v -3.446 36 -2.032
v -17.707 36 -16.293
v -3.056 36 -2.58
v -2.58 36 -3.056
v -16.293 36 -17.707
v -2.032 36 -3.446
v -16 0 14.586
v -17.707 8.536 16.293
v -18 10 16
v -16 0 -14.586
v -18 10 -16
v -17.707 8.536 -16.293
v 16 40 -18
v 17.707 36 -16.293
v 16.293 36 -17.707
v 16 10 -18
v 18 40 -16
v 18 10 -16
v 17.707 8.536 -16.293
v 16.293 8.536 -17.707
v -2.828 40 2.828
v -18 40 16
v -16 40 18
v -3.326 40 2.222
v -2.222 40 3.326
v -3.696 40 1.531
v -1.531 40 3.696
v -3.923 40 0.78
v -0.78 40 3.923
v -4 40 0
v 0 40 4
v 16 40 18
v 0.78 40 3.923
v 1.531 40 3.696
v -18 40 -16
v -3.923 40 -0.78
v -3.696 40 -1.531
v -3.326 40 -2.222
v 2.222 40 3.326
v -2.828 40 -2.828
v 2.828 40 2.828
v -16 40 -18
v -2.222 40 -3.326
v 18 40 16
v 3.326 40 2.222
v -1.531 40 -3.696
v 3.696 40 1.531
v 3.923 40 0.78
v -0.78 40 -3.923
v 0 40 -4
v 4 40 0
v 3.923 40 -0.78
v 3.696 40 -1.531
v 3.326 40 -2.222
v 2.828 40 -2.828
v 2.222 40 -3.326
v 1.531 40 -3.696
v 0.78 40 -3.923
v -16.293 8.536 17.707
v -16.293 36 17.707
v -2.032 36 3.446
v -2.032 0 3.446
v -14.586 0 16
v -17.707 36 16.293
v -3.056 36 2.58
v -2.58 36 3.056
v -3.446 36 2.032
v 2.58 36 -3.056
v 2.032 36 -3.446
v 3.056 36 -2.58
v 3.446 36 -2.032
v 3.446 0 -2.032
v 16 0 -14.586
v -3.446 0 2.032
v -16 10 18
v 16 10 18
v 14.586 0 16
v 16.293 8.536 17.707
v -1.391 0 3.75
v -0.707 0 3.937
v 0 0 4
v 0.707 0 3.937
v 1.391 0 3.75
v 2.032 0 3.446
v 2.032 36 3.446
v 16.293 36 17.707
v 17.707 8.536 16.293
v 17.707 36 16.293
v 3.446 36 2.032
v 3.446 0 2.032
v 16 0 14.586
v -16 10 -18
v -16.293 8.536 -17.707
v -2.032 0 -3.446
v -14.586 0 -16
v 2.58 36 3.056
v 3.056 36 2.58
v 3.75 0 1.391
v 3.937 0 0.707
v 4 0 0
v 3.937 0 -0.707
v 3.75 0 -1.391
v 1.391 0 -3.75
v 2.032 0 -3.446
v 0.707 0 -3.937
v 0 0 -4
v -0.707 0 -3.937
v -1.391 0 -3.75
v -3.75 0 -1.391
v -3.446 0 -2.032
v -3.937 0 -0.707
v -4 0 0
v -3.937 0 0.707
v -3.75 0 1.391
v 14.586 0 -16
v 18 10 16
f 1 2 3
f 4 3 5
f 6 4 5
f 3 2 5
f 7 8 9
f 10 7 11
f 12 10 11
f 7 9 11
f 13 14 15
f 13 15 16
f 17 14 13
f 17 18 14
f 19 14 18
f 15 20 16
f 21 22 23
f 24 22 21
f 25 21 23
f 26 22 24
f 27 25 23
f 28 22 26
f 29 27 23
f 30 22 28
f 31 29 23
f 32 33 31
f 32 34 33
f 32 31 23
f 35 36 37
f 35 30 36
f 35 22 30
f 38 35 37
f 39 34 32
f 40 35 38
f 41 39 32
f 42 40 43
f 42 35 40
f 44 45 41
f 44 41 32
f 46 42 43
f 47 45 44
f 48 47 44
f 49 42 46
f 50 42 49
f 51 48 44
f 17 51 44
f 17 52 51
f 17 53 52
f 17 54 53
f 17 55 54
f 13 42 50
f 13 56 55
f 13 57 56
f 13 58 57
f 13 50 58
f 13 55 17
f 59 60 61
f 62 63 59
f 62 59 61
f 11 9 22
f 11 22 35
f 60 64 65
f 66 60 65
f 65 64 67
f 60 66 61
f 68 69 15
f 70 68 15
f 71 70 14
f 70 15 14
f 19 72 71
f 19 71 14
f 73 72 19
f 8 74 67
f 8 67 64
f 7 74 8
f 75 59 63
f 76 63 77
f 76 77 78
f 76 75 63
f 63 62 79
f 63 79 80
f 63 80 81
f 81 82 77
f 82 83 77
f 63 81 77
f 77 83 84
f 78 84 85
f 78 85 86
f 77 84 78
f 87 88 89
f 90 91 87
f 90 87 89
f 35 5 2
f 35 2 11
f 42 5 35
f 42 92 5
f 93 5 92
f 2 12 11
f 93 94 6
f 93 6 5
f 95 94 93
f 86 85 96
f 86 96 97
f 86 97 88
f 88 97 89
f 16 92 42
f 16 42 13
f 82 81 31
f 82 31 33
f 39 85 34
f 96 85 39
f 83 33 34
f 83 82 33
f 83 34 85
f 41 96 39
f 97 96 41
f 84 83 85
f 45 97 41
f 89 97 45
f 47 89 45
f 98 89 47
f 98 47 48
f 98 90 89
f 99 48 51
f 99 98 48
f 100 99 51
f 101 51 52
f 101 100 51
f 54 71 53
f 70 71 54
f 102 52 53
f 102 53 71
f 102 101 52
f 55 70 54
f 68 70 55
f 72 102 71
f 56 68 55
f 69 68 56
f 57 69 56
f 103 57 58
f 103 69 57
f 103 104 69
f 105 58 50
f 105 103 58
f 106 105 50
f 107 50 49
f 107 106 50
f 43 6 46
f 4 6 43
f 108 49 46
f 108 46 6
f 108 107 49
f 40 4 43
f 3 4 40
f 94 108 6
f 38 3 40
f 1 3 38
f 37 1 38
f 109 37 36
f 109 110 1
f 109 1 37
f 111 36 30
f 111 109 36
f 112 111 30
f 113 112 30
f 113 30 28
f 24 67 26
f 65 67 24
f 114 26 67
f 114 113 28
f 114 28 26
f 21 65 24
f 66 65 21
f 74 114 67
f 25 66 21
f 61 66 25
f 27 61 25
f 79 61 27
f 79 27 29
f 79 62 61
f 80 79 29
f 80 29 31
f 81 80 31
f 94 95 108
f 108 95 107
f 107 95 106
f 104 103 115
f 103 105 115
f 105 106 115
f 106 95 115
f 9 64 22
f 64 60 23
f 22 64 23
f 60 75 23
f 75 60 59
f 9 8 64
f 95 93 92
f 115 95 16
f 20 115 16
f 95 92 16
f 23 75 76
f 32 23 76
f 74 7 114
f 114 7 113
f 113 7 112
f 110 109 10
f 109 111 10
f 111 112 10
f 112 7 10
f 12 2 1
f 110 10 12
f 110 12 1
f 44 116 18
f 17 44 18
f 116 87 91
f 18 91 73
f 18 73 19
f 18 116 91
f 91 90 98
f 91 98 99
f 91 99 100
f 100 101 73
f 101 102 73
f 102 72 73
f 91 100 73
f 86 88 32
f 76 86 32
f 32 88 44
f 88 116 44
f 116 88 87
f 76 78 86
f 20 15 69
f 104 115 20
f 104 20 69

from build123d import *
from OCP.BRepFilletAPI import BRepFilletAPI_MakeChamfer

# Parameters (mm, degrees)
SKETCH1_W           = 36
SKETCH1_H           = 36
SKETCH1_R           = 4
BOSS_EXTRUDE1_DEPTH = 40
CUT_EXTRUDE1_DEPTH  = 36
CHAMFER1_SIZE       = 2
CHAMFER2_SIZE       = 2
CHAMFER2_SIZE2      = 10


with BuildPart() as part:
    # Sketch1 → Boss-Extrude1 (new body)
    with BuildSketch(Plane(origin=(0, 0, 0), x_dir=(1, 0, 0), z_dir=(0, 1, 0))):
        Rectangle(SKETCH1_W, SKETCH1_H)
        with Locations(Location((0, 0, 0), (0, 0, 270))):
            Circle(SKETCH1_R, mode=Mode.SUBTRACT)
    extrude(amount=BOSS_EXTRUDE1_DEPTH)

    # Sketch2 → Cut-Extrude1 (cut)
    with BuildSketch(Plane(origin=(0, 0, 0), x_dir=(1, 0, 0), z_dir=(0, 1, 0))):
        Polygon((-18.585786438, -20), (0, -1.414213562), (18.585786438, -20), (20, -20), (20, -18.585786438), (1.414213562, 0), (20, 18.585786438), (20, 20), (18.585786438, 20), (0, 1.414213562), (-18.585786438, 20), (-20, 20), (-20, 18.585786438), (-1.414213562, 0), (-20, -18.585786438), (-20, -20), align=None)
    extrude(amount=CUT_EXTRUDE1_DEPTH, mode=Mode.SUBTRACT)

    # Chamfer1
    chamfer1_edges = [part.edges().sort_by_distance(p)[0] for p in [
        (-18, 38, -18),
        (18, 38, -18),
        (-18, 38, 18),
        (18, 38, 18),
    ]]
    chamfer(chamfer1_edges, length=CHAMFER1_SIZE)

    # Chamfer2: one chamfer whose edges measure the first distance from different faces: ONE call of the kernel's chamfer builder (chamfer() names one face for all edges)
    chamfer2_edges_1 = [part.edges().sort_by_distance(p)[0] for p in [
        (0, 0, -18),
    ]]
    chamfer2_side_1 = [part.faces().sort_by_distance(p)[0] for p in [
        (0, 0, -12.666463052),
    ]]
    chamfer2_edges_2 = [part.edges().sort_by_distance(p)[0] for p in [
        (18, 0, 0),
    ]]
    chamfer2_side_2 = [part.faces().sort_by_distance(p)[0] for p in [
        (12.666463052, 0, 0),
    ]]
    chamfer2_edges_3 = [part.edges().sort_by_distance(p)[0] for p in [
        (0, 0, 18),
    ]]
    chamfer2_side_3 = [part.faces().sort_by_distance(p)[0] for p in [
        (0, 0, 12.666463052),
    ]]
    chamfer2_edges_4 = [part.edges().sort_by_distance(p)[0] for p in [
        (-18, 0, 0),
    ]]
    chamfer2_side_4 = [part.faces().sort_by_distance(p)[0] for p in [
        (-12.666463052, 0, 0),
    ]]
    chamfer2 = BRepFilletAPI_MakeChamfer(part.part.solid().wrapped)
    for e in chamfer2_edges_1:
        chamfer2.Add(CHAMFER2_SIZE, CHAMFER2_SIZE2, e.wrapped, chamfer2_side_1[0].wrapped)  # the first distance lies on this face
    for e in chamfer2_edges_2:
        chamfer2.Add(CHAMFER2_SIZE, CHAMFER2_SIZE2, e.wrapped, chamfer2_side_2[0].wrapped)  # the first distance lies on this face
    for e in chamfer2_edges_3:
        chamfer2.Add(CHAMFER2_SIZE, CHAMFER2_SIZE2, e.wrapped, chamfer2_side_3[0].wrapped)  # the first distance lies on this face
    for e in chamfer2_edges_4:
        chamfer2.Add(CHAMFER2_SIZE, CHAMFER2_SIZE2, e.wrapped, chamfer2_side_4[0].wrapped)  # the first distance lies on this face
    add(Compound.cast(chamfer2.Shape()), mode=Mode.REPLACE)


solid = part.part
